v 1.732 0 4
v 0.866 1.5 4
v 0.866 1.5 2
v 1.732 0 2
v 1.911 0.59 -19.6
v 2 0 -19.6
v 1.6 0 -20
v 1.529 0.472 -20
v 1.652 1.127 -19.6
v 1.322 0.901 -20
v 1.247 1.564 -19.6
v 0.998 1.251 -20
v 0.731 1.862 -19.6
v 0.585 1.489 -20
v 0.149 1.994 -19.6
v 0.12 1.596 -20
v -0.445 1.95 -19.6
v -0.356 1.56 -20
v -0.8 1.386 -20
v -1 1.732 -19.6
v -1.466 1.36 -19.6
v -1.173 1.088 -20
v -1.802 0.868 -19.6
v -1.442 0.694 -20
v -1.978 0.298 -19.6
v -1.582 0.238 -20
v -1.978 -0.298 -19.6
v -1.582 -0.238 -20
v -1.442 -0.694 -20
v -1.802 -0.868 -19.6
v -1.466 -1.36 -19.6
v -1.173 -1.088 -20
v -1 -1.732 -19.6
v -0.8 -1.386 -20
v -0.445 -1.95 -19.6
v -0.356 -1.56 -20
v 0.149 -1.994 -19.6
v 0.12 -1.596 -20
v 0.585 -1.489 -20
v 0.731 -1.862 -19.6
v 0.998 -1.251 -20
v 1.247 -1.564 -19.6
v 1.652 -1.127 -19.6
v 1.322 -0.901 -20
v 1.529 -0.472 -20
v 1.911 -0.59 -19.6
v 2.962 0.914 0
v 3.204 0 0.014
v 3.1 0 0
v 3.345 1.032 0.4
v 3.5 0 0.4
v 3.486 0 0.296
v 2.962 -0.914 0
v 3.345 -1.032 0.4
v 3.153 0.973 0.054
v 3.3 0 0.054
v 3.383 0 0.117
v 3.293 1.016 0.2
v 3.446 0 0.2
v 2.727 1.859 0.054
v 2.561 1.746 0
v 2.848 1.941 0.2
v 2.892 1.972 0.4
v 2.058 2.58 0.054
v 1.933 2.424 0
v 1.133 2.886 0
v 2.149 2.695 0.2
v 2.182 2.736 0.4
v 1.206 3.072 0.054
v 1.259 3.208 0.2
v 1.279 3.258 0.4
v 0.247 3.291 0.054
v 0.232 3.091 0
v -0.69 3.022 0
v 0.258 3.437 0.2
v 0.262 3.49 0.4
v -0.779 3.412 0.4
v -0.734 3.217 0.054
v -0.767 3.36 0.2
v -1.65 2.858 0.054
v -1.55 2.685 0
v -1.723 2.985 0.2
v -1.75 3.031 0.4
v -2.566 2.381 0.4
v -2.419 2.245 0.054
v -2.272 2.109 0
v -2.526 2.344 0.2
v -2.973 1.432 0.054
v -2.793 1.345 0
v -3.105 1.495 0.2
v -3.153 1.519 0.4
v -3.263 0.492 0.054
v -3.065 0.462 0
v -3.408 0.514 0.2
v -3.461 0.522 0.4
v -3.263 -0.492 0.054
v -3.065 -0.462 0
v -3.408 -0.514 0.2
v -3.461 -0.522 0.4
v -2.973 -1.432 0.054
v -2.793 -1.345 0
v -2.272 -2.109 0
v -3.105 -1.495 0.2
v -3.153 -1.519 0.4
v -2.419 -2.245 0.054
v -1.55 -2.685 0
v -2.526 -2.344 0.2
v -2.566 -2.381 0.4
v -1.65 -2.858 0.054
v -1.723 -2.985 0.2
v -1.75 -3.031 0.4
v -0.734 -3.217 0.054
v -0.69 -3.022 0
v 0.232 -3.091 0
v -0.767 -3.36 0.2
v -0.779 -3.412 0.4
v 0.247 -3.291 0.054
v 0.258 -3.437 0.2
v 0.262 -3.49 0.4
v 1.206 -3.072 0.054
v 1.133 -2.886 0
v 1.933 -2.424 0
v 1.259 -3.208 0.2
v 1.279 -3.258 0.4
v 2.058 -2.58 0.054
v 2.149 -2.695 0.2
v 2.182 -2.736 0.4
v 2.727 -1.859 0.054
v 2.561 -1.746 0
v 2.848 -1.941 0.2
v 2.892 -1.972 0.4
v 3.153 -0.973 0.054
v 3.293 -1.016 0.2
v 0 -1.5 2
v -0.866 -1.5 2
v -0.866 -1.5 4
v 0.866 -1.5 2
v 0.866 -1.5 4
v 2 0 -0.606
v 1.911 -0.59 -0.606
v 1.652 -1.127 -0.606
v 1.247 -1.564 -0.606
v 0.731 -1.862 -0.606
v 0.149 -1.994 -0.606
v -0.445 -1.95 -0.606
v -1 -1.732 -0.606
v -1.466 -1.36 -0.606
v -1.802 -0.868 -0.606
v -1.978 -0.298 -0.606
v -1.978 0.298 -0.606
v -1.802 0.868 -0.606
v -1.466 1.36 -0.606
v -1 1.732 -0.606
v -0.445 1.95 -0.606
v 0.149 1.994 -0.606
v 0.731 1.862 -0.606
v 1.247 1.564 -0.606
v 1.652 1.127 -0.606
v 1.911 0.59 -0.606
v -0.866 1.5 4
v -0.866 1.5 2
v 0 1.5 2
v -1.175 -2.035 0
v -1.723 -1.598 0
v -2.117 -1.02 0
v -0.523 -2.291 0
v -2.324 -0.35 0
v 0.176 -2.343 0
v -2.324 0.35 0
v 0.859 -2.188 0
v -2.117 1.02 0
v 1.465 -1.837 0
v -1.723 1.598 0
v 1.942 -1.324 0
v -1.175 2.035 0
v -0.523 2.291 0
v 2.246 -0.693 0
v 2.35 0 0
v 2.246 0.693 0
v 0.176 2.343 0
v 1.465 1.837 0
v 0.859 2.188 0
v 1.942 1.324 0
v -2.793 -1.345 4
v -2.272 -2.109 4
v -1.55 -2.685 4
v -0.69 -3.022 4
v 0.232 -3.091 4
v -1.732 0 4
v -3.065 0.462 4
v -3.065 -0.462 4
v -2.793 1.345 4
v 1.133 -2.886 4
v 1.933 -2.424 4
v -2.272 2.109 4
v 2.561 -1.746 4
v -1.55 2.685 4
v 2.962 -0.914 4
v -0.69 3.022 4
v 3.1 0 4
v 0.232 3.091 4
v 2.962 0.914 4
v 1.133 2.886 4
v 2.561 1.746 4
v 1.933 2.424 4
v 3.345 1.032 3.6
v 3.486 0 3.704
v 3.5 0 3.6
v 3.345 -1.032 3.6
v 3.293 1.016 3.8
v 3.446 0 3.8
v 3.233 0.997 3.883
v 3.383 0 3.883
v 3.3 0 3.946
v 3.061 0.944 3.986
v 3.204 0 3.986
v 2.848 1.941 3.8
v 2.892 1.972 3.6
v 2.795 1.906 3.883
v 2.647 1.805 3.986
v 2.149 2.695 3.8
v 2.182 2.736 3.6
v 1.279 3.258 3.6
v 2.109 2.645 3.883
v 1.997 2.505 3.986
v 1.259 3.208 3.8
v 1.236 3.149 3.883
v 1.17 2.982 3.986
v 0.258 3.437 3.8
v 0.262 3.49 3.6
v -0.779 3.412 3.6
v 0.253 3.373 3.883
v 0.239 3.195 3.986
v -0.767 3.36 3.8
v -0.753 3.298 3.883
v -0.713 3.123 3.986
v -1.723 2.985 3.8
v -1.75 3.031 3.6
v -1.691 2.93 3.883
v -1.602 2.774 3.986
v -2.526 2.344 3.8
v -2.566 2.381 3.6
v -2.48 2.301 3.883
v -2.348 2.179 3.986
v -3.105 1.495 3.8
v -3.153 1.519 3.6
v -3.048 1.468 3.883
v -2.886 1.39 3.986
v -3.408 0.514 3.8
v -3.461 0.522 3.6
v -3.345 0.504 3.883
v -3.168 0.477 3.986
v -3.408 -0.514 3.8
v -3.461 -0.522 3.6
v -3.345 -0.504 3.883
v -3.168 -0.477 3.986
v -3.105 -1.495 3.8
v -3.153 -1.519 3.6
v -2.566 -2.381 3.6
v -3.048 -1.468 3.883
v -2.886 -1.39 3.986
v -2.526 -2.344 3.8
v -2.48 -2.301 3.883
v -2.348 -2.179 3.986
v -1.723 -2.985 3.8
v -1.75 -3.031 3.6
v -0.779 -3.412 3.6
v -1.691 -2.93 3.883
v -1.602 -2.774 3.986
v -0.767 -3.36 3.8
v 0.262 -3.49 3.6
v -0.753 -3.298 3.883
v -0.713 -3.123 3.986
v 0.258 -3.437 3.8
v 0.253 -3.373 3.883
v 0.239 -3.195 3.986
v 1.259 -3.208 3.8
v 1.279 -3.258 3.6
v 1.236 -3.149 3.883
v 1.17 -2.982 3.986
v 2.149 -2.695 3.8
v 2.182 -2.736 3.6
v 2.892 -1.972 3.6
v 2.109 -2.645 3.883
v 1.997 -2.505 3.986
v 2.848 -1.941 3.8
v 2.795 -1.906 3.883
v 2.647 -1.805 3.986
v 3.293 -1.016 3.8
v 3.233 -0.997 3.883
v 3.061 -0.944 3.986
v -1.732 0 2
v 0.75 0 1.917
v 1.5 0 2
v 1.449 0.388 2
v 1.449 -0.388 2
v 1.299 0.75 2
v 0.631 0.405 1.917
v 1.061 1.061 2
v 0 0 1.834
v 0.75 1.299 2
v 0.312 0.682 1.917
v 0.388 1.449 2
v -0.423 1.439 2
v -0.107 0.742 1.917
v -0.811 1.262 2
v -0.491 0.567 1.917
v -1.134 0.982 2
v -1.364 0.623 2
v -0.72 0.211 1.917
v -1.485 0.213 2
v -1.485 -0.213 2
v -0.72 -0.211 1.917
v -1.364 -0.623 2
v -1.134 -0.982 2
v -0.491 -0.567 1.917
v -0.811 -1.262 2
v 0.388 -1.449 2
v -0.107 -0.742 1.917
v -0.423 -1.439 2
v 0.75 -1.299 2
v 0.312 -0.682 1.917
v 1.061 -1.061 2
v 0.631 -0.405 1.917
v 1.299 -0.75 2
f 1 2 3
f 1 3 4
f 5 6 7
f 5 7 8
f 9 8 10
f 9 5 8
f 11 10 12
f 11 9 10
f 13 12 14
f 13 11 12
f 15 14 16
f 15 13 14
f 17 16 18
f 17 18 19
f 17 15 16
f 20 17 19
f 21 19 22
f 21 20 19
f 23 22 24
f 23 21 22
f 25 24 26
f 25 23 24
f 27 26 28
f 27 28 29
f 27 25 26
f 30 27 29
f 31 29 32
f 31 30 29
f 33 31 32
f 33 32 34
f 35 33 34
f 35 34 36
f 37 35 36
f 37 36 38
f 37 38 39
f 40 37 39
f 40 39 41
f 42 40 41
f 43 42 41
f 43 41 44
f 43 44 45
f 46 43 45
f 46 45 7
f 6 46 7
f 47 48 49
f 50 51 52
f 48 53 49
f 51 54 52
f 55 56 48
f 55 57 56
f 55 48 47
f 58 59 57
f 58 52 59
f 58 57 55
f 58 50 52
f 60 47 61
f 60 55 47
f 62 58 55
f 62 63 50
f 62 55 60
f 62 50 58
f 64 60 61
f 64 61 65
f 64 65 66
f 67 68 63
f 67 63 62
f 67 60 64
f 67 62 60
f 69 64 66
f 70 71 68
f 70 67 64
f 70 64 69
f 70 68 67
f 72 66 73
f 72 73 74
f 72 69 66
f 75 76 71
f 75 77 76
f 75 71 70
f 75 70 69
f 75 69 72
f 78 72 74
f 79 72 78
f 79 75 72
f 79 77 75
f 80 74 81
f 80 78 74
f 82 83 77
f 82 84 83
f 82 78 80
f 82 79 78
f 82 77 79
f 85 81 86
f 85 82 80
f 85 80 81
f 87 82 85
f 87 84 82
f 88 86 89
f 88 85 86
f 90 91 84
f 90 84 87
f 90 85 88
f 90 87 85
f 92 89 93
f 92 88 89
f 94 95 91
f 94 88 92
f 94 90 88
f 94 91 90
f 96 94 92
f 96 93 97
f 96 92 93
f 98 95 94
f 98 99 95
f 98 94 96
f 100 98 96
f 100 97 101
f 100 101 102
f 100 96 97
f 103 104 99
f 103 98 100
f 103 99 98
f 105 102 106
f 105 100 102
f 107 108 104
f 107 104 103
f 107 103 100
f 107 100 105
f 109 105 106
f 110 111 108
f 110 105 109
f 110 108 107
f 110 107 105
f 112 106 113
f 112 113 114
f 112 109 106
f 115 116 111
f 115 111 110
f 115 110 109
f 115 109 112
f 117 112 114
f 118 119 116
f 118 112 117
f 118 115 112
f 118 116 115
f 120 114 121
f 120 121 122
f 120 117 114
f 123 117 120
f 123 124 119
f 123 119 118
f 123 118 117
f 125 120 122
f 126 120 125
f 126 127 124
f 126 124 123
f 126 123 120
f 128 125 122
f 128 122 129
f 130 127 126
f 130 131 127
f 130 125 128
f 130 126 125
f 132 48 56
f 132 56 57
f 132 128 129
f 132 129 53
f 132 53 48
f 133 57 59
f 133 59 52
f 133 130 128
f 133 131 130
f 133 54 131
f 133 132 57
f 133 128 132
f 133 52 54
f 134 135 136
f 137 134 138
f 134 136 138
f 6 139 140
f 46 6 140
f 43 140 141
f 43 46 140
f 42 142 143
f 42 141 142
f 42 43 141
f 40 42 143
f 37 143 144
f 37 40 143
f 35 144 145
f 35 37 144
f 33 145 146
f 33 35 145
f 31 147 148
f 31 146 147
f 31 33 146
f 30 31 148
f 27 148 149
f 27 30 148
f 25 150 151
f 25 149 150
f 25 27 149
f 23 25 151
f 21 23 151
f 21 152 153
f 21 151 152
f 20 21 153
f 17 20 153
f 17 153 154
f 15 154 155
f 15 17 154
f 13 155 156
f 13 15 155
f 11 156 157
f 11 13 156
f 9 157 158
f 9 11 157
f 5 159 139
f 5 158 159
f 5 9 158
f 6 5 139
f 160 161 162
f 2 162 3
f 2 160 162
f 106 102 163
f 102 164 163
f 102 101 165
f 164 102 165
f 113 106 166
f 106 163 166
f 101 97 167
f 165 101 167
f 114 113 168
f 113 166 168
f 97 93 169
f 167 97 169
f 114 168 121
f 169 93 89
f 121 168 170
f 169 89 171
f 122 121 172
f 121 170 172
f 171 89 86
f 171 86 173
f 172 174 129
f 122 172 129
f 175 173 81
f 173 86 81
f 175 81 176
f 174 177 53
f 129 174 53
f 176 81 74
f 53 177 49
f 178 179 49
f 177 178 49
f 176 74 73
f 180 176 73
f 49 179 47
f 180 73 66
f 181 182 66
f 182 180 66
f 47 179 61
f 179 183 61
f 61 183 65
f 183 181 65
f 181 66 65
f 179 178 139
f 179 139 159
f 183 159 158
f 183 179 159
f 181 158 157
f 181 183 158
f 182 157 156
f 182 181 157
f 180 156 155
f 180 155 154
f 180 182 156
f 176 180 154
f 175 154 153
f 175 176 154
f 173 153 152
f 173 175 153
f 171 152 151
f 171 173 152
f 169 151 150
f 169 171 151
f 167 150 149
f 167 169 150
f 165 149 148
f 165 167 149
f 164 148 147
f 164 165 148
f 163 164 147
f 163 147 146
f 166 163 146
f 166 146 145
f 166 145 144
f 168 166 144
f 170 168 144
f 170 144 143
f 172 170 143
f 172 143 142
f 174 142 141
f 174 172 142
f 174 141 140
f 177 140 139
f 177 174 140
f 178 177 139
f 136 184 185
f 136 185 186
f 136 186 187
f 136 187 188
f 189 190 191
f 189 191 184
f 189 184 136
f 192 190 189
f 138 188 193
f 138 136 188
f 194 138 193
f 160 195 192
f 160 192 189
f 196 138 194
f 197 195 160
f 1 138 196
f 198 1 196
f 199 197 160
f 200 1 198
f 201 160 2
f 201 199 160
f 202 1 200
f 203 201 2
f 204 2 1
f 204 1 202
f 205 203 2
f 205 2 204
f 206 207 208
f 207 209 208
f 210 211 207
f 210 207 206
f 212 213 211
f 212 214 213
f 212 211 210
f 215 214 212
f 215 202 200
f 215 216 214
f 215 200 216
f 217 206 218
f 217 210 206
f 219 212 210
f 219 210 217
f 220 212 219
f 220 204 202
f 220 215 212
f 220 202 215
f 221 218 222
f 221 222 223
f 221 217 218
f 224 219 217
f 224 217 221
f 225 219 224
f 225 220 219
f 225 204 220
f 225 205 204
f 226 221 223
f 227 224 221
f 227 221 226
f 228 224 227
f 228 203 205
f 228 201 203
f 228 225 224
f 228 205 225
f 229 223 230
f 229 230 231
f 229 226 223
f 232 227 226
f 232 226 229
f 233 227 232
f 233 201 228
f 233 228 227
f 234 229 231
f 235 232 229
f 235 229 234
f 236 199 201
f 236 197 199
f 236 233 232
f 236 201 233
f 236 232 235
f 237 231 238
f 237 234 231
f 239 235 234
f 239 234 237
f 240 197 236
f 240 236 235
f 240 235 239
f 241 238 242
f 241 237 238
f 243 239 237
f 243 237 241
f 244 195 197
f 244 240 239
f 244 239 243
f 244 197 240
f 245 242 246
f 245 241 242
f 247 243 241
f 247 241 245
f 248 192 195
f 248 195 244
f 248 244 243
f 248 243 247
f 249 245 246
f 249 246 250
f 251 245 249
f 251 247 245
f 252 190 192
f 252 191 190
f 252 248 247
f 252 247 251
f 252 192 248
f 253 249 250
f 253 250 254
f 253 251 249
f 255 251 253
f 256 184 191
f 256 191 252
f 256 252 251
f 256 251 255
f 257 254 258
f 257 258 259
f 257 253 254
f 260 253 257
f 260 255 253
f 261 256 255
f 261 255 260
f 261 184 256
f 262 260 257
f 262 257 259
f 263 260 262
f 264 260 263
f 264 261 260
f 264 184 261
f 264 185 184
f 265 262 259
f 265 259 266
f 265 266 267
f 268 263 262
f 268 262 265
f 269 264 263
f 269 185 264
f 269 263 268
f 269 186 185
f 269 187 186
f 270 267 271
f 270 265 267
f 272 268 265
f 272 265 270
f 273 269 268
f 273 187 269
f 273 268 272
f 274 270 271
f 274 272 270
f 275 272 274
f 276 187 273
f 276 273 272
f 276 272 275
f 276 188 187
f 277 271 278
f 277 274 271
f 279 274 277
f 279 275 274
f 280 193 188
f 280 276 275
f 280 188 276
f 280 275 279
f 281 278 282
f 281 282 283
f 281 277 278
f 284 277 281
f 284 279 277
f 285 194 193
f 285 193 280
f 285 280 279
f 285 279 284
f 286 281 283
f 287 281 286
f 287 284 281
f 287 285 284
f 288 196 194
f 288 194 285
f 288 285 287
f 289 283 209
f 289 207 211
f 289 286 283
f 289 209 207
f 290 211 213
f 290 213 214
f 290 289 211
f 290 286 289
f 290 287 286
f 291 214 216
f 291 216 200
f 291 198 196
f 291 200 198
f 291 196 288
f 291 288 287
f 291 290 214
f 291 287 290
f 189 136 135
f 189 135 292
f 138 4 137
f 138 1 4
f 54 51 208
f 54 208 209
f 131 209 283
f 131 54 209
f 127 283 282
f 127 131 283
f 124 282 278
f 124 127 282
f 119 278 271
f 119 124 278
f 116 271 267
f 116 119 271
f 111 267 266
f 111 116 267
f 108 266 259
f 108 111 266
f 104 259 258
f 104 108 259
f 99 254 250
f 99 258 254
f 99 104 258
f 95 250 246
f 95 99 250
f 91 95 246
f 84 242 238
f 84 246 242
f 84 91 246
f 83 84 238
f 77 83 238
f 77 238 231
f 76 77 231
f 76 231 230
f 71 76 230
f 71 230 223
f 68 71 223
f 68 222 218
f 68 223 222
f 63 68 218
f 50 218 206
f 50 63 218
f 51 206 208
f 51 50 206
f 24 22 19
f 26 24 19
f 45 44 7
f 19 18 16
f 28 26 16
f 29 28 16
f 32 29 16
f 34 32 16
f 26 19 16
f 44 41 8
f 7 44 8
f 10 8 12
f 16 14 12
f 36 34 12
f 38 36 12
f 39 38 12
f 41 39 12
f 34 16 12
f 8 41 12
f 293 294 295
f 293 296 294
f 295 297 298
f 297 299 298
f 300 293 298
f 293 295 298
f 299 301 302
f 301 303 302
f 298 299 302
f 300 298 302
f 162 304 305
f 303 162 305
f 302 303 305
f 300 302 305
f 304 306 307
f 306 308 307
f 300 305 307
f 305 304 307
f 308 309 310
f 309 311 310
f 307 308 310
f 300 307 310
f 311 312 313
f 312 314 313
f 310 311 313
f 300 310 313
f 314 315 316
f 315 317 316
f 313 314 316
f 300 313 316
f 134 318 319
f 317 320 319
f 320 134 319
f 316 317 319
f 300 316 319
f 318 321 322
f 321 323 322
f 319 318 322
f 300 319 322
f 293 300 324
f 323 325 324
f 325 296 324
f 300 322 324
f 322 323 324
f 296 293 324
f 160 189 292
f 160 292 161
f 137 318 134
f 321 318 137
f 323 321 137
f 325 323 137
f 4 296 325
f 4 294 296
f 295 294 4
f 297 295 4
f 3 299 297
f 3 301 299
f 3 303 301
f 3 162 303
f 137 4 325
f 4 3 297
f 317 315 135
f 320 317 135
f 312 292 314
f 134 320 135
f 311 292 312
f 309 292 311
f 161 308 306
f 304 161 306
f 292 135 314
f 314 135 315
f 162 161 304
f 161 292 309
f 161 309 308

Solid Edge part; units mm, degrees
sketch "Sketch1" plane through (0, 0, 0) normal (0, -1, 0) x (1, 0, 0)
  line L0 (3.5, 4) -> (3.5, 0)
  line L1 (3.5, 0) -> (2.35, 0)
  line L2 (2.35, 0) -> (2, -0.6062)
  line L3 (2, -0.6062) -> (2, -20)
  line L4 (2, -20) -> (0, -20)
  line L5 (1.5, 2) -> (0, 1.834)
  line L6 (1.5, 4) -> (1.5, 2)
  line L7 (3.5, 4) -> (1.5, 4)
  dimension "D1" = 2
  dimension "D2" = 20
  dimension "D3" = 4
revolve "RevolvedProtrusion1" add sketch "Sketch1" angle 360 about axis through (0, 0, -6) along (0, 0, 1)
cosmetic_thread "Thread1" size "M4"
chamfer "Chamfer_1" distance 0.4 angle 45 1 edges at (-2, 0, -20)
fillet "Round_1" radius 0.4 2 edges at (-3.5, 0, 0) (-3.5, 0, 4)
sketch "Sketch2" plane through (0, 0, 4) normal (0, 0, 1) x (0, 1, 0)
  line L0 (-1.5, 0.866) -> (-1.5, -0.866)
  line L1 (0, -1.7321) -> (-1.5, -0.866)
  line L2 (1.5, -0.866) -> (0, -1.7321)
  line L3 (1.5, 0.866) -> (1.5, -0.866)
  line L4 (0, 1.7321) -> (1.5, 0.866)
  line L5 (-1.5, 0.866) -> (0, 1.7321)
extrude "Cutout1" cut sketch "Sketch2" against normal up to vertex (2 mm away)
properties material "Galvanized steel"
